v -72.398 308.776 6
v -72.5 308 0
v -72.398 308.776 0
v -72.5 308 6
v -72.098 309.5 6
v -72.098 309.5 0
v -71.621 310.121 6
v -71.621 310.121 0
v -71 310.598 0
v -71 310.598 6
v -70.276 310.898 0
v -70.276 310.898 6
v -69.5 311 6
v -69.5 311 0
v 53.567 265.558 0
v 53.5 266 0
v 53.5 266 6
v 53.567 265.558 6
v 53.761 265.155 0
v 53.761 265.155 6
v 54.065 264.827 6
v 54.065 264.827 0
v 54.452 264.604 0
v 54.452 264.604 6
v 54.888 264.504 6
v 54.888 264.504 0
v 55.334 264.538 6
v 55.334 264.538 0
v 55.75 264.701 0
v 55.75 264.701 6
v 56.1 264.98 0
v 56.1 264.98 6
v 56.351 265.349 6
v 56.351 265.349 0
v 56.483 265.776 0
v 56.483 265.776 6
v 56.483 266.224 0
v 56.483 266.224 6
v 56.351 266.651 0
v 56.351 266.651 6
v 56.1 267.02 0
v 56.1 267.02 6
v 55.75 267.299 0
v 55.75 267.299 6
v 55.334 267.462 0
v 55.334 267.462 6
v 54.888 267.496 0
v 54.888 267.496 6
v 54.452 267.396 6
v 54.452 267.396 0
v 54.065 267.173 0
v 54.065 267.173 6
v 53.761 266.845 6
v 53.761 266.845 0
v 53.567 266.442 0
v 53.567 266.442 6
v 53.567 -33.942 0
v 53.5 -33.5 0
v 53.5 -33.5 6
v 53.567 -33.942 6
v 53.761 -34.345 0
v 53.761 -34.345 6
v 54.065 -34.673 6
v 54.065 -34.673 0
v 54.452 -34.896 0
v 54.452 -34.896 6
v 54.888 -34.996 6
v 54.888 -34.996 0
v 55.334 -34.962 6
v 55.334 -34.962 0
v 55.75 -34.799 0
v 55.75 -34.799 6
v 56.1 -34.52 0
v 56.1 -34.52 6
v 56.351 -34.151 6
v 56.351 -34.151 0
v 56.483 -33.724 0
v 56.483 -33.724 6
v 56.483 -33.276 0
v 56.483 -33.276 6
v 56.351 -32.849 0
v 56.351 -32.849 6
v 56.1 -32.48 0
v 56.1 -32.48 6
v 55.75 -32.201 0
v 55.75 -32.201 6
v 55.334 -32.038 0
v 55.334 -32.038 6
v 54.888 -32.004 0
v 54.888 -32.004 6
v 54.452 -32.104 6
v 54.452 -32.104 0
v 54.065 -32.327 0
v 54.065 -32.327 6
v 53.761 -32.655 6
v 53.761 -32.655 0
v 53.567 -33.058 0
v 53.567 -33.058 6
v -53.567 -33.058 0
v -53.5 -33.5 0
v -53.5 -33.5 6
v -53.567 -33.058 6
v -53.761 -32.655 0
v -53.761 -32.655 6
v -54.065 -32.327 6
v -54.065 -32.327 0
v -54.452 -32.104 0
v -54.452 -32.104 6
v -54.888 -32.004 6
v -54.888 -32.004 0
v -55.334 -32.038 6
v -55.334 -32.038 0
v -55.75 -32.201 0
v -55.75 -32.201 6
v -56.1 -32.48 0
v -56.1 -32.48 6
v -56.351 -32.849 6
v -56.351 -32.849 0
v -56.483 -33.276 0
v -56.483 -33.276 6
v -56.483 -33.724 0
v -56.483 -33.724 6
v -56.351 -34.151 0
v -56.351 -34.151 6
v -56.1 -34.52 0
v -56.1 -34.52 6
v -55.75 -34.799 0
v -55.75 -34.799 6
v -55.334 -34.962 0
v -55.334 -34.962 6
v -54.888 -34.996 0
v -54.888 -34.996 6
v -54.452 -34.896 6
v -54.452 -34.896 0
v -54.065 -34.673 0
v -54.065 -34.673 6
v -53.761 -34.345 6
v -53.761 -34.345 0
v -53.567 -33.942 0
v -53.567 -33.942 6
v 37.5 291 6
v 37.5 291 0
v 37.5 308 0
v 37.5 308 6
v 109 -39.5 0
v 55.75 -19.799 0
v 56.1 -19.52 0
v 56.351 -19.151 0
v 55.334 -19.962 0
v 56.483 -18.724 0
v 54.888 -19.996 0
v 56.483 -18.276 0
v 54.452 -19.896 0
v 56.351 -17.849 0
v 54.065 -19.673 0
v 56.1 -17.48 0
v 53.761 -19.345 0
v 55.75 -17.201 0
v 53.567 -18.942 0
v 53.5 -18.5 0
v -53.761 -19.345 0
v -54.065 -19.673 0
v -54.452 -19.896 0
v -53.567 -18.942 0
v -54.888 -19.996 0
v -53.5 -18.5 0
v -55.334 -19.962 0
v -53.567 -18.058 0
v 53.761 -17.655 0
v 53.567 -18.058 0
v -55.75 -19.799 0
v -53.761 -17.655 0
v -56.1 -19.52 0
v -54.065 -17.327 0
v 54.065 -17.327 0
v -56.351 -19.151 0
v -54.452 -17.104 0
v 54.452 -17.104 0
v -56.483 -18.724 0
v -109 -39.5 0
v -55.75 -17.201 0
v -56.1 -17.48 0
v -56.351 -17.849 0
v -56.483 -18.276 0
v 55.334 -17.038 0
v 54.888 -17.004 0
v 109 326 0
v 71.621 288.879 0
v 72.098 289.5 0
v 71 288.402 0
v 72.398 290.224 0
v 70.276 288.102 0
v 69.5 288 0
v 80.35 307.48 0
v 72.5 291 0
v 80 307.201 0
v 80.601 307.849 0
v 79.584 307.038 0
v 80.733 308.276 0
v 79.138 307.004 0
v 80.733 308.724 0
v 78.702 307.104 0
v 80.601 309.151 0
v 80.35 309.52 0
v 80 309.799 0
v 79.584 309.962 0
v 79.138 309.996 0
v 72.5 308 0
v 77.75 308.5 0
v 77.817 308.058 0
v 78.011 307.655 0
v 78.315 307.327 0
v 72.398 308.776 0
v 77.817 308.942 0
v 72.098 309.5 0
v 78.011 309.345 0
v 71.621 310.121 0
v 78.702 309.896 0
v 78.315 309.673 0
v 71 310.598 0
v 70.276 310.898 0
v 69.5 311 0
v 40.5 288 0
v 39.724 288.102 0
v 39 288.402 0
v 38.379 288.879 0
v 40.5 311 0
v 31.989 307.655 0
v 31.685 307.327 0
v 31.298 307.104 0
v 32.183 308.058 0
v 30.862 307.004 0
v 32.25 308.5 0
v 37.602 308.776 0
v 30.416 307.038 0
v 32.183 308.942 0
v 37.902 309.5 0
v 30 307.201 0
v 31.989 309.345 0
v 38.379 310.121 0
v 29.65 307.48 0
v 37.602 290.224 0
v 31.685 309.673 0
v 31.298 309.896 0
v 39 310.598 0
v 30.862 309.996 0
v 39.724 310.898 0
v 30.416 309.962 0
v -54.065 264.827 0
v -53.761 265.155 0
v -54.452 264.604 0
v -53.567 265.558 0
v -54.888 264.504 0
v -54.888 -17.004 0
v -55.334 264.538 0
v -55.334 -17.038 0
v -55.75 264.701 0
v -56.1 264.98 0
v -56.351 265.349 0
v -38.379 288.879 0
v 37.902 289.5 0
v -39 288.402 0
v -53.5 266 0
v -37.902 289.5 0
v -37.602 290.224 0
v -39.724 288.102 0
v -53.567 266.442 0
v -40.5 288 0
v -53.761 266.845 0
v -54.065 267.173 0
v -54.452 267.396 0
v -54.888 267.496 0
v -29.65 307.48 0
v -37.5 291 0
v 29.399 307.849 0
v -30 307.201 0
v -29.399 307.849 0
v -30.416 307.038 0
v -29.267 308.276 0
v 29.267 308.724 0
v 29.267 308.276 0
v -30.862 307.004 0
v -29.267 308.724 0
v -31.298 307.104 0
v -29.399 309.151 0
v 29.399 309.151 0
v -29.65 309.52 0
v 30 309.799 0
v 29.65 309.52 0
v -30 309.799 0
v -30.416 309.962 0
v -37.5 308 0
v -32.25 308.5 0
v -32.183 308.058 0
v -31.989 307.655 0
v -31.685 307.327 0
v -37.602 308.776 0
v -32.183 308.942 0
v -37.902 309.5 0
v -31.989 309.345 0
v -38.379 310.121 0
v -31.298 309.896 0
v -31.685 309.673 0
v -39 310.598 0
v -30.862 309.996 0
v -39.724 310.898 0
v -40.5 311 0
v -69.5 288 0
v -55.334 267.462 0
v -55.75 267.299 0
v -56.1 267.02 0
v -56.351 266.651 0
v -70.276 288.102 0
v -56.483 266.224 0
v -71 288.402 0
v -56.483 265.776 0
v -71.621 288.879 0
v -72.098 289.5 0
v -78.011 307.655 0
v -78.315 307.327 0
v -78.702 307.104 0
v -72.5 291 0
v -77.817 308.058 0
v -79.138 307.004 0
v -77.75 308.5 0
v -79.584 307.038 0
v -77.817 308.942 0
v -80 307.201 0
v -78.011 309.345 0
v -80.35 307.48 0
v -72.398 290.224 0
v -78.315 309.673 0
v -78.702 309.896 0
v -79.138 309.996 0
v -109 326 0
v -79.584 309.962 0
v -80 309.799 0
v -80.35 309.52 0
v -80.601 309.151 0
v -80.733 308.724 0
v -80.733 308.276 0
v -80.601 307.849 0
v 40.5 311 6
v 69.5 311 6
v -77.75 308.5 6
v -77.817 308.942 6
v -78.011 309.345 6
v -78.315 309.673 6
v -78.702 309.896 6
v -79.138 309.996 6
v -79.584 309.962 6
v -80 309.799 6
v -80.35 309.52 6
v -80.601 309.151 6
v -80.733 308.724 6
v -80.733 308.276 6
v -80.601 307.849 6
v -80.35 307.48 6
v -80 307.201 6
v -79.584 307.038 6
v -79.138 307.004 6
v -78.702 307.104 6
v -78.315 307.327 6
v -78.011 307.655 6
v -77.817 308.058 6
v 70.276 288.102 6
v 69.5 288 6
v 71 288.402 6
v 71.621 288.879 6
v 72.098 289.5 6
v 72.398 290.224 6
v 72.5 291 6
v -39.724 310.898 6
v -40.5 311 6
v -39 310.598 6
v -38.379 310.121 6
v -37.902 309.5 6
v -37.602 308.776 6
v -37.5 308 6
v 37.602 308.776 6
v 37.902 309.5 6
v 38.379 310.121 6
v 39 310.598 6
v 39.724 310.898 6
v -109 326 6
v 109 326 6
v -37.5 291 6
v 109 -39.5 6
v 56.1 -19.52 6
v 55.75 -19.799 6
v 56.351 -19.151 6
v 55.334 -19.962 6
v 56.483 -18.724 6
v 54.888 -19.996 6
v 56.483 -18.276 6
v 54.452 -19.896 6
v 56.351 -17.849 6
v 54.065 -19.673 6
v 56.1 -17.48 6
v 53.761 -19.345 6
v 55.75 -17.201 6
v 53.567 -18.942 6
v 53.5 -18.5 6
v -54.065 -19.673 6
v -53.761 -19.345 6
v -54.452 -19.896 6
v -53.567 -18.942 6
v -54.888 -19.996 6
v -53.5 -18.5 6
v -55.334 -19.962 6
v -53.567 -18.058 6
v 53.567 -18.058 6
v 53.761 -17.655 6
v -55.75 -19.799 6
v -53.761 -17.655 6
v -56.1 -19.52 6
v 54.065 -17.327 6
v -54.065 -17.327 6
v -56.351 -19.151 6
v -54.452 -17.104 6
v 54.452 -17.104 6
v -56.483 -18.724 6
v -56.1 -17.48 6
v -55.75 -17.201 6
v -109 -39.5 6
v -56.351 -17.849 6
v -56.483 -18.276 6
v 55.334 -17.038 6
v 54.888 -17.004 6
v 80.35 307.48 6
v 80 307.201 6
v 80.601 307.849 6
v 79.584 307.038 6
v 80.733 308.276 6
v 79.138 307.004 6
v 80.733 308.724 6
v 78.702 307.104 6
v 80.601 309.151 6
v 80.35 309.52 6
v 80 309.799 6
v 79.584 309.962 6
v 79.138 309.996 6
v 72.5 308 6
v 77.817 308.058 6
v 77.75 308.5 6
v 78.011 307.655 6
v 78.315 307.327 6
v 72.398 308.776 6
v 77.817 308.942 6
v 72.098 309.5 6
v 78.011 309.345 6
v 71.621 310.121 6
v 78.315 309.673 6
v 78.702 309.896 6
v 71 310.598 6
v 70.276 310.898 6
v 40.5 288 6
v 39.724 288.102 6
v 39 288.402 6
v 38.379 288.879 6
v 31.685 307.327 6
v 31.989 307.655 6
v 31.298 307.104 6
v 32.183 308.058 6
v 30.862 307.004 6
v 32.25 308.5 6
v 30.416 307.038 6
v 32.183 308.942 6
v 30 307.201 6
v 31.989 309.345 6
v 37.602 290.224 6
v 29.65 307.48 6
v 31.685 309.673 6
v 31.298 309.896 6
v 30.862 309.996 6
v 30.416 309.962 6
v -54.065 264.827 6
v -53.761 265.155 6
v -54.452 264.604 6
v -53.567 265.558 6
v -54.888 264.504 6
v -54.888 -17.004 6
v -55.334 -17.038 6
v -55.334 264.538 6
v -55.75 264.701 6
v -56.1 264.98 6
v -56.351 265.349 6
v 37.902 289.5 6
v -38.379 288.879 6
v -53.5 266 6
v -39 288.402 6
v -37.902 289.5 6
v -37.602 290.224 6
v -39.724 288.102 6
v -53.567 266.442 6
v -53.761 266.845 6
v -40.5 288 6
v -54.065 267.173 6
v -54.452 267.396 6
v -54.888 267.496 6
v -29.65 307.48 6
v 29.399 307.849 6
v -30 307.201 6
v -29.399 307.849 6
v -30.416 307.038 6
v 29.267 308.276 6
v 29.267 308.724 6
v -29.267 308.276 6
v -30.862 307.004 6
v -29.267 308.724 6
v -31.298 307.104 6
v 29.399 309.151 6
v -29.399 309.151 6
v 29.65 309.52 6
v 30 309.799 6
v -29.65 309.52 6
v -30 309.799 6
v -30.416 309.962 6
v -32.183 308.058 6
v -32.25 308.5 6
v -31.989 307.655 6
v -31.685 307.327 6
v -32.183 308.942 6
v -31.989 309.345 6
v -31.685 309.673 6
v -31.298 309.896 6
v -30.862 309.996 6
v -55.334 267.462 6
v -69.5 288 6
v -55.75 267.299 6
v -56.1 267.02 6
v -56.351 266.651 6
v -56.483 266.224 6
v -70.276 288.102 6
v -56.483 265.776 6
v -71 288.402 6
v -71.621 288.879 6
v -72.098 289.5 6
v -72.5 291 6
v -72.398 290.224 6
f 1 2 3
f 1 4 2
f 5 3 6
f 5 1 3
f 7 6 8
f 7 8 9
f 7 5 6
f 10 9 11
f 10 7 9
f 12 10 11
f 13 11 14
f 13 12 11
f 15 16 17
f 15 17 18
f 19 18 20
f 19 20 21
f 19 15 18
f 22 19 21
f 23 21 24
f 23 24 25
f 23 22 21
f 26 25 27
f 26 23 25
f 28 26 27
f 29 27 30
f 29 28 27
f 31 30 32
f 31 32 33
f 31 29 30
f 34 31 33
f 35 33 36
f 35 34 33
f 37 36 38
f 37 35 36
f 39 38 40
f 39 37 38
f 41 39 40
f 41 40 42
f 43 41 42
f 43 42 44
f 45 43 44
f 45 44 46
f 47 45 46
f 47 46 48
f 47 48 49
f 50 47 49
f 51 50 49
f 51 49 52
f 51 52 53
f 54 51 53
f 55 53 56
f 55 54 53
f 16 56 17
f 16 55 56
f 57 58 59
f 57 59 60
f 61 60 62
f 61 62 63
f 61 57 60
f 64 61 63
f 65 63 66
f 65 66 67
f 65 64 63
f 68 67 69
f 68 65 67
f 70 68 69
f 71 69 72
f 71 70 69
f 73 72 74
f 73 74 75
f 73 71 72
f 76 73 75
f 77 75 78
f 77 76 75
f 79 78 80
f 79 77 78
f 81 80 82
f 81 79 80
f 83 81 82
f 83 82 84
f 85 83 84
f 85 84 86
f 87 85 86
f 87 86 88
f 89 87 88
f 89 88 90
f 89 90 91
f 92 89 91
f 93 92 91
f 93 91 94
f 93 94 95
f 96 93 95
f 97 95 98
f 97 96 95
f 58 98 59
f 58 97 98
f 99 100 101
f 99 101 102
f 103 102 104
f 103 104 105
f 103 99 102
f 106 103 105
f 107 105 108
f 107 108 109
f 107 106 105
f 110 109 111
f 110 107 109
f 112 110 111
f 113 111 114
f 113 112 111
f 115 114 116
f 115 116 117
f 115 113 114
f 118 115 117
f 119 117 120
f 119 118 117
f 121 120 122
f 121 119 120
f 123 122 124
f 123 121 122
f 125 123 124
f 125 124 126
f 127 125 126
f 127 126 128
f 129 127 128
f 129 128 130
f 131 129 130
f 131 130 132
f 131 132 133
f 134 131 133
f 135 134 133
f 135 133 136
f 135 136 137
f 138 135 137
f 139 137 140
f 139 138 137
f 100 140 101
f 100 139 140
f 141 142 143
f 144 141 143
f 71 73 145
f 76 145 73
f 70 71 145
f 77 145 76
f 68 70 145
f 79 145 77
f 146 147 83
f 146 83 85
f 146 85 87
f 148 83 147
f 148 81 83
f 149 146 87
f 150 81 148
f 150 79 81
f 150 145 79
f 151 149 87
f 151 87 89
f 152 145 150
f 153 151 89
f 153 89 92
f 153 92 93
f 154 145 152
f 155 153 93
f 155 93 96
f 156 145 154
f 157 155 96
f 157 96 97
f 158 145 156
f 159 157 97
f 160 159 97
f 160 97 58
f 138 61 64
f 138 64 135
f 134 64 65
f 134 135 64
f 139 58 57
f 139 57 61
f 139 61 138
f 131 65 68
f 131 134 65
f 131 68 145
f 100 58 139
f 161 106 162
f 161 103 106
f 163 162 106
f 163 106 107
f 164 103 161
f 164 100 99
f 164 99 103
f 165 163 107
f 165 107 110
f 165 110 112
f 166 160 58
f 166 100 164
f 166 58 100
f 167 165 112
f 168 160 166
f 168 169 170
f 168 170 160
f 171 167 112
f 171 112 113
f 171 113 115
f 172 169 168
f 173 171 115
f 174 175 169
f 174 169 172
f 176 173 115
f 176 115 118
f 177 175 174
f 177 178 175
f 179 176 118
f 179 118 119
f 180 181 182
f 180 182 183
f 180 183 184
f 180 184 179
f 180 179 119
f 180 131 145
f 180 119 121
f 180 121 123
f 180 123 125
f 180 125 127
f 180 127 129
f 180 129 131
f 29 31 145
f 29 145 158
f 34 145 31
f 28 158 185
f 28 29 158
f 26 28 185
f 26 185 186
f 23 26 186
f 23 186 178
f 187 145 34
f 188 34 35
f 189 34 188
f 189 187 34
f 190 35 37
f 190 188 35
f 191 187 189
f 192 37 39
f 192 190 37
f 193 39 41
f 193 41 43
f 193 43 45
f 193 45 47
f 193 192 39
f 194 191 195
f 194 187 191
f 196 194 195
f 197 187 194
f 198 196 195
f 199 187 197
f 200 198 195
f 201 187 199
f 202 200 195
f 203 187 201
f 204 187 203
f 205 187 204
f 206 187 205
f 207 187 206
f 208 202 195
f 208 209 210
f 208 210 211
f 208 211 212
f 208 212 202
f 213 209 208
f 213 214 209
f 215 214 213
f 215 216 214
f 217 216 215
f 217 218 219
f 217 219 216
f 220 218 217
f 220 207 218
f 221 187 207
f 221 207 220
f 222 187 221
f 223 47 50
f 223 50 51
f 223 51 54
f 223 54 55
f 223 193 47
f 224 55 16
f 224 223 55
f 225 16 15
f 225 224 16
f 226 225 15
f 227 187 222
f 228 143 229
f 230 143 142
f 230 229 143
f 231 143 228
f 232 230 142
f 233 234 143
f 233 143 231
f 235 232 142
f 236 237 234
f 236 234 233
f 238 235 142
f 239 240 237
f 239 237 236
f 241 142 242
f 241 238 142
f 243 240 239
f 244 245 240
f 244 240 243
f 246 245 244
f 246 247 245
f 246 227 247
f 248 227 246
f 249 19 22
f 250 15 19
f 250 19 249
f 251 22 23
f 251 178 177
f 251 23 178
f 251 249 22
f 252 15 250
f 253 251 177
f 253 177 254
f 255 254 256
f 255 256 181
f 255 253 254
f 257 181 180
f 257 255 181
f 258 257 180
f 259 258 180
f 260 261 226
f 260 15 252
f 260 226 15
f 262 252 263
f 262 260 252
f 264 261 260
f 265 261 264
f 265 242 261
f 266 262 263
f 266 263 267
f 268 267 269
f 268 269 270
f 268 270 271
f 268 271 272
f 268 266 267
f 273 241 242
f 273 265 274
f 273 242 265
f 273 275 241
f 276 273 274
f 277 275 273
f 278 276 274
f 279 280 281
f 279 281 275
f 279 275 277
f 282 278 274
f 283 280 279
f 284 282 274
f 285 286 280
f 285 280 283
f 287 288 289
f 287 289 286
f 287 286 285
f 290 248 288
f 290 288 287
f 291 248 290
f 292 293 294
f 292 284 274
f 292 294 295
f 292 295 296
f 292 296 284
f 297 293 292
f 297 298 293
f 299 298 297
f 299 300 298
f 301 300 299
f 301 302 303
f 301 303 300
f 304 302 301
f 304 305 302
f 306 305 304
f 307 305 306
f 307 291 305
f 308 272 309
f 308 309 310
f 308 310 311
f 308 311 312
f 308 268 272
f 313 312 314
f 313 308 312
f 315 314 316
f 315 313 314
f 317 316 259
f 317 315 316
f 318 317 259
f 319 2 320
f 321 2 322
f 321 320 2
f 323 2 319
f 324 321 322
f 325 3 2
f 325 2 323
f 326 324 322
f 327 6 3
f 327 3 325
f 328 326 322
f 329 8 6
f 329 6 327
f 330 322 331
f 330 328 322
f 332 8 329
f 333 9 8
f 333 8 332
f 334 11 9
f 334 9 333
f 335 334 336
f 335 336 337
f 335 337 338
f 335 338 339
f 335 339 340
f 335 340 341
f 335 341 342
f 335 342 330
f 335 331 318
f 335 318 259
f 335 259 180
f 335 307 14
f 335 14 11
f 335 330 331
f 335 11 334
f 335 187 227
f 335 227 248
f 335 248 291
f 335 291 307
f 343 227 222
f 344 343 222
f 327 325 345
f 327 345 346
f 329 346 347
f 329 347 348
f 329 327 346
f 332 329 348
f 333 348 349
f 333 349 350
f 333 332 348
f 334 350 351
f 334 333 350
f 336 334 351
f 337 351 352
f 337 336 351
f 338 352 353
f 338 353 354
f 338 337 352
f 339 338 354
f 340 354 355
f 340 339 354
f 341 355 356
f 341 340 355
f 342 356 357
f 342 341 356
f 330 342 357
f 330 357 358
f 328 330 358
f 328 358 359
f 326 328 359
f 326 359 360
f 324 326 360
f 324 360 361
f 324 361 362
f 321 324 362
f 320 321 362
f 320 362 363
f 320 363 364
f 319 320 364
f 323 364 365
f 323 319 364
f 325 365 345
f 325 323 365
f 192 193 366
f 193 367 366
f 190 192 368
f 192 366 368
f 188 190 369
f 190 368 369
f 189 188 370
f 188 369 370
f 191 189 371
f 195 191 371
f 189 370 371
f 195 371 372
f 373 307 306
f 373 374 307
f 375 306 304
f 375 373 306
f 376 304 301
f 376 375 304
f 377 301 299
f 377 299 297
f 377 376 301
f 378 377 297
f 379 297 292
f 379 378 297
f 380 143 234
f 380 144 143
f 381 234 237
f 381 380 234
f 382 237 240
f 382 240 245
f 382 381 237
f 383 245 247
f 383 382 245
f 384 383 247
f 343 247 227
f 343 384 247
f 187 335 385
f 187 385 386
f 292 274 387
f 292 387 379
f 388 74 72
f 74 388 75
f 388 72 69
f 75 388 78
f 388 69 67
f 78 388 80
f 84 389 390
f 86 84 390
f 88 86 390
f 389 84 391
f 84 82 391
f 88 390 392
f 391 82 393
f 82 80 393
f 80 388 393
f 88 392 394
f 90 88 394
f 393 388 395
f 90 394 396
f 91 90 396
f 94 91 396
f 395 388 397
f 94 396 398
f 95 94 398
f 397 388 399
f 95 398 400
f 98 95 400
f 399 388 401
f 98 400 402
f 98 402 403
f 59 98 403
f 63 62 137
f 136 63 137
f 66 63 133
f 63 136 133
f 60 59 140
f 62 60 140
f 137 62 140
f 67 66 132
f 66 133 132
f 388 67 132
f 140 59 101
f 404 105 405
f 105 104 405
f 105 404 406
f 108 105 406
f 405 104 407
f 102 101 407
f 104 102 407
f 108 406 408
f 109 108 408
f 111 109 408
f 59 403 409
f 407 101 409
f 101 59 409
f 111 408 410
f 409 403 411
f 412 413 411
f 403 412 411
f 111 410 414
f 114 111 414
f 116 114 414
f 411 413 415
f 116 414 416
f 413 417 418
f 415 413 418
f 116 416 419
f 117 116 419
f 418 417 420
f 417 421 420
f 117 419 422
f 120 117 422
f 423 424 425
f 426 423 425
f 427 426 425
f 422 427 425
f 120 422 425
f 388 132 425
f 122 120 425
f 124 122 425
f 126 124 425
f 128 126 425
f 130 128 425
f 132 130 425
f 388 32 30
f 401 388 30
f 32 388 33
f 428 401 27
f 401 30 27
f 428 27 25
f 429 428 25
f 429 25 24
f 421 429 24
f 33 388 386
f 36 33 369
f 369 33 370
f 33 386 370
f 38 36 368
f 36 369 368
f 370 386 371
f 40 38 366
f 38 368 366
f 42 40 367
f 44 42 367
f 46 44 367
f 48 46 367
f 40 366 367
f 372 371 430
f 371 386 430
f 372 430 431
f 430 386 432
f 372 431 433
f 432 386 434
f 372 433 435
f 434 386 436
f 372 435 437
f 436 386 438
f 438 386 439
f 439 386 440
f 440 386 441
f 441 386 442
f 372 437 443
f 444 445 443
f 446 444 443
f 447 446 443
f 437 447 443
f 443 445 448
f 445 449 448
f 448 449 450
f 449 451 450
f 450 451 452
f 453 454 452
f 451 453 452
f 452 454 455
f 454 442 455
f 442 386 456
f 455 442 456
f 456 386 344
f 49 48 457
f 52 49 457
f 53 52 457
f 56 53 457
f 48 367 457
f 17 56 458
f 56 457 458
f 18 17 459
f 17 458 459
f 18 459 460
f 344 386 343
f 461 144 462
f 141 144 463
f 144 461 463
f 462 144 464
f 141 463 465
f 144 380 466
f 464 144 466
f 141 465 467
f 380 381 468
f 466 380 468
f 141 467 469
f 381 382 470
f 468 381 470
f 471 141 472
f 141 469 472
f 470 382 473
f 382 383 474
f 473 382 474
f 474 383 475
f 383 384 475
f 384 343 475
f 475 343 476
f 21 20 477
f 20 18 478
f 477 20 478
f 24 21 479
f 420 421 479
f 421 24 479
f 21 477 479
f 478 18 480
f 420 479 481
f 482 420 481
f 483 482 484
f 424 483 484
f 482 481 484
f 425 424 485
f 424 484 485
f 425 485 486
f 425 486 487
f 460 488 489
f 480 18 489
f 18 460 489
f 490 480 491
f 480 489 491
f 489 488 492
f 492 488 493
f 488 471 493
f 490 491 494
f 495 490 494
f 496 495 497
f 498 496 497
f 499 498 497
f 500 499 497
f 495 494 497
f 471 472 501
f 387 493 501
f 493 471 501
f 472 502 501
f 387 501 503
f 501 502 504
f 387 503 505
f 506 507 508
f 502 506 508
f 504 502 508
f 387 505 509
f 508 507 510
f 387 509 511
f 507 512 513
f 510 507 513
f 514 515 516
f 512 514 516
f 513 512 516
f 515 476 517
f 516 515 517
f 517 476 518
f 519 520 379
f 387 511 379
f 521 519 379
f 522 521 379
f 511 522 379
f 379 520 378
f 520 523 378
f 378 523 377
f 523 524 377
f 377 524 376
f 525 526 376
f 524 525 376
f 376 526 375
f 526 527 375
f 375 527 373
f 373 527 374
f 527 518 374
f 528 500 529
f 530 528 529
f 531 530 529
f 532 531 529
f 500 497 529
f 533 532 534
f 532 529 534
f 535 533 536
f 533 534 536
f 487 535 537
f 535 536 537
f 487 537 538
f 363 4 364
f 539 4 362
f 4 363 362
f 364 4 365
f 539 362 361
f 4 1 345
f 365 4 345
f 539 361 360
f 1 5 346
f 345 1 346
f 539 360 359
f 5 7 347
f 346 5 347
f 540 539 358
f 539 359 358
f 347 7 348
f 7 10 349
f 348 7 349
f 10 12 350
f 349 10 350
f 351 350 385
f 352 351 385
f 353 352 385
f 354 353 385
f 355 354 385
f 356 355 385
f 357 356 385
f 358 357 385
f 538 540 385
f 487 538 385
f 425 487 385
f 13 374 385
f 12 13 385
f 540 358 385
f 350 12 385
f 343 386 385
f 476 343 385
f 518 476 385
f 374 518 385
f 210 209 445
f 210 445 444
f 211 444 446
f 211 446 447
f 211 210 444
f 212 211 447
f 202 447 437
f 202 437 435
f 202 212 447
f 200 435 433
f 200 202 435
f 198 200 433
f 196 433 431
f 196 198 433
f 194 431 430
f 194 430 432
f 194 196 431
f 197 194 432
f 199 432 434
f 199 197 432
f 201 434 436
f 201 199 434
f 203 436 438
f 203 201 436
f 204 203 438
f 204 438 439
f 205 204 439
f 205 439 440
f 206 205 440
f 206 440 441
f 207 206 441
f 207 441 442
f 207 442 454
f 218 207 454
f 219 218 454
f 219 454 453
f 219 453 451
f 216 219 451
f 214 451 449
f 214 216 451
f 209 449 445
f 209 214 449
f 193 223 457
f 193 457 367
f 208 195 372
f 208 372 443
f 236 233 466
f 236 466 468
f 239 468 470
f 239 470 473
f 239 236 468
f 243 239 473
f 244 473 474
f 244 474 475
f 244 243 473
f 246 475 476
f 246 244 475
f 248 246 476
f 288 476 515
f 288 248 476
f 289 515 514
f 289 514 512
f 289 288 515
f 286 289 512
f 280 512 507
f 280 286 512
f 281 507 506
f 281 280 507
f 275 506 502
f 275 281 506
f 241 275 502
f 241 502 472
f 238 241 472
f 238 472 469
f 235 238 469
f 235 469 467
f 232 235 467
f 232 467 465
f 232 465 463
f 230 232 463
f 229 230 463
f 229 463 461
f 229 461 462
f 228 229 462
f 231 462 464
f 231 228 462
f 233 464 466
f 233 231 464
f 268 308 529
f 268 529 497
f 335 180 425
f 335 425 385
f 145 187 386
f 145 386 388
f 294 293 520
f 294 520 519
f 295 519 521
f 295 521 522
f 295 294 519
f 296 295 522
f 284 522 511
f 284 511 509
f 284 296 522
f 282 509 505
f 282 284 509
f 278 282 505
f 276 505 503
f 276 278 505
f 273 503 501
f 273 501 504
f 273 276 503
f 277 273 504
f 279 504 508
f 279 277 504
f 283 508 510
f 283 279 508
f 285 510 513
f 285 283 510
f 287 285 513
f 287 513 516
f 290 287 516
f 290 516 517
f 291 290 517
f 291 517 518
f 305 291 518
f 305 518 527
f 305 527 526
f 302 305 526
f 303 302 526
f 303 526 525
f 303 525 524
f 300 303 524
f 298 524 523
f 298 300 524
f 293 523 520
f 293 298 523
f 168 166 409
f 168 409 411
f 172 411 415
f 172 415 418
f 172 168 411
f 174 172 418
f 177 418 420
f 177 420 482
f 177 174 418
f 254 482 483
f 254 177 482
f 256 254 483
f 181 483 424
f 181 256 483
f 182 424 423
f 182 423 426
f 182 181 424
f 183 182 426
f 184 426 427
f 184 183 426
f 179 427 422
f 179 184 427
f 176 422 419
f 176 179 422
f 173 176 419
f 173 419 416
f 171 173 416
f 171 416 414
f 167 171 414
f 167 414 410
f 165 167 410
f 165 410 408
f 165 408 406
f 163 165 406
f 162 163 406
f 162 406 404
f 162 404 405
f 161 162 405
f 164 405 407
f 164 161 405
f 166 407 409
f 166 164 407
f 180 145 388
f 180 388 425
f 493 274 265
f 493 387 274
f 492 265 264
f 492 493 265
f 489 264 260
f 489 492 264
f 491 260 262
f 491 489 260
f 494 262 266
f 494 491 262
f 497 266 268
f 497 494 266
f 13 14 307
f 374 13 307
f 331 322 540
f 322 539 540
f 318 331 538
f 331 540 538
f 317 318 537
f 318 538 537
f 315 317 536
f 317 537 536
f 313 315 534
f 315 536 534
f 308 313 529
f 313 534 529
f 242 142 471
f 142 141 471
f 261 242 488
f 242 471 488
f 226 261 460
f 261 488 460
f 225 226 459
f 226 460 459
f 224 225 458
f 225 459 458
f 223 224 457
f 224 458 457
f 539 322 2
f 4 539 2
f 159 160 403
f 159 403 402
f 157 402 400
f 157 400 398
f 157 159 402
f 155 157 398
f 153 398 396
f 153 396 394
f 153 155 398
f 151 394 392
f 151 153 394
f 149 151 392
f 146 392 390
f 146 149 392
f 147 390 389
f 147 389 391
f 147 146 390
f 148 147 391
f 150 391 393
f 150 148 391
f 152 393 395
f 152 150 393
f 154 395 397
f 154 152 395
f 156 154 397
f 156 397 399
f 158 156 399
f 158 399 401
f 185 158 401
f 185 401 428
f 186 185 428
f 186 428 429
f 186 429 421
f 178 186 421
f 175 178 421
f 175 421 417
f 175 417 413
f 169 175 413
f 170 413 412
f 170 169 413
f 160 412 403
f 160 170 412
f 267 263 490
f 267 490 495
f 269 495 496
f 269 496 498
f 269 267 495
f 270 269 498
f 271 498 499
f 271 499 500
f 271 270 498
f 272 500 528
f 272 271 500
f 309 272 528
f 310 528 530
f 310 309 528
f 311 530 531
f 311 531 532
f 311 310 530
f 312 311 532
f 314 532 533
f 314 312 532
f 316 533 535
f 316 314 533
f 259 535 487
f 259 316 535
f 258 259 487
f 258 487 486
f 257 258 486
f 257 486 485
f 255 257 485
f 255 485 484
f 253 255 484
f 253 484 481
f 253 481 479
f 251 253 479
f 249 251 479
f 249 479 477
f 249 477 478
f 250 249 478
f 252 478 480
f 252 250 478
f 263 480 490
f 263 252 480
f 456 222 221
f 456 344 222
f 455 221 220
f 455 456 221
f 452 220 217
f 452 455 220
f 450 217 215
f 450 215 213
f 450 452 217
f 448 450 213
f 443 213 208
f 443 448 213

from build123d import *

# Parameters (mm, degrees)
SKETCH_1_R      = 1.5
SKETCH_1_W      = 35
SKETCH_1_H      = 23
EXTRUDE_1_DEPTH = 6
FILLET_1_R      = 3


with BuildPart() as part:
    # Эскиз1 → Бобышка-Вытянуть1 (new body)
    with BuildSketch(Plane.XY):
        Polygon((-109, 326), (109, 326), (109, -39.5), (-109.000135664, -39.5), align=None)
        with Locations((-55, -33.5)):
            Circle(SKETCH_1_R, mode=Mode.SUBTRACT)
        with Locations((-55, -18.5)):
            Circle(SKETCH_1_R, mode=Mode.SUBTRACT)
        with Locations(Location((55, -18.5, 0), (0, 0, 180))):
            Circle(SKETCH_1_R, mode=Mode.SUBTRACT)
        with Locations(Location((55, -33.5, 0), (0, 0, 180))):
            Circle(SKETCH_1_R, mode=Mode.SUBTRACT)
        with Locations((-79.25, 308.5)):
            Circle(SKETCH_1_R, mode=Mode.SUBTRACT)
        with Locations((-55, 266)):
            Circle(SKETCH_1_R, mode=Mode.SUBTRACT)
        with Locations(Location((-30.75, 308.5, 0), (0, 0, 180))):
            Circle(SKETCH_1_R, mode=Mode.SUBTRACT)
        with Locations((30.75, 308.5)):
            Circle(SKETCH_1_R, mode=Mode.SUBTRACT)
        with Locations(Location((55, 266, 0), (0, 0, 180))):
            Circle(SKETCH_1_R, mode=Mode.SUBTRACT)
        with Locations(Location((79.25, 308.5, 0), (0, 0, 180))):
            Circle(SKETCH_1_R, mode=Mode.SUBTRACT)
        with Locations((55, 299.5)):
            Rectangle(SKETCH_1_W, SKETCH_1_H, mode=Mode.SUBTRACT)
        with Locations((-55, 299.5)):
            Rectangle(SKETCH_1_W, SKETCH_1_H, mode=Mode.SUBTRACT)
    extrude(amount=EXTRUDE_1_DEPTH)

    # Скругление1
    fillet_1_edges = [part.edges().sort_by_distance(p)[0] for p in [
        (-72.5, 311, 3),
        (-72.5, 288, 3),
        (-37.5, 288, 3),
        (-37.5, 311, 3),
        (37.5, 288, 3),
        (72.5, 288, 3),
        (72.5, 311, 3),
        (37.5, 311, 3),
    ]]
    fillet(fillet_1_edges, radius=FILLET_1_R)


solid = part.part
